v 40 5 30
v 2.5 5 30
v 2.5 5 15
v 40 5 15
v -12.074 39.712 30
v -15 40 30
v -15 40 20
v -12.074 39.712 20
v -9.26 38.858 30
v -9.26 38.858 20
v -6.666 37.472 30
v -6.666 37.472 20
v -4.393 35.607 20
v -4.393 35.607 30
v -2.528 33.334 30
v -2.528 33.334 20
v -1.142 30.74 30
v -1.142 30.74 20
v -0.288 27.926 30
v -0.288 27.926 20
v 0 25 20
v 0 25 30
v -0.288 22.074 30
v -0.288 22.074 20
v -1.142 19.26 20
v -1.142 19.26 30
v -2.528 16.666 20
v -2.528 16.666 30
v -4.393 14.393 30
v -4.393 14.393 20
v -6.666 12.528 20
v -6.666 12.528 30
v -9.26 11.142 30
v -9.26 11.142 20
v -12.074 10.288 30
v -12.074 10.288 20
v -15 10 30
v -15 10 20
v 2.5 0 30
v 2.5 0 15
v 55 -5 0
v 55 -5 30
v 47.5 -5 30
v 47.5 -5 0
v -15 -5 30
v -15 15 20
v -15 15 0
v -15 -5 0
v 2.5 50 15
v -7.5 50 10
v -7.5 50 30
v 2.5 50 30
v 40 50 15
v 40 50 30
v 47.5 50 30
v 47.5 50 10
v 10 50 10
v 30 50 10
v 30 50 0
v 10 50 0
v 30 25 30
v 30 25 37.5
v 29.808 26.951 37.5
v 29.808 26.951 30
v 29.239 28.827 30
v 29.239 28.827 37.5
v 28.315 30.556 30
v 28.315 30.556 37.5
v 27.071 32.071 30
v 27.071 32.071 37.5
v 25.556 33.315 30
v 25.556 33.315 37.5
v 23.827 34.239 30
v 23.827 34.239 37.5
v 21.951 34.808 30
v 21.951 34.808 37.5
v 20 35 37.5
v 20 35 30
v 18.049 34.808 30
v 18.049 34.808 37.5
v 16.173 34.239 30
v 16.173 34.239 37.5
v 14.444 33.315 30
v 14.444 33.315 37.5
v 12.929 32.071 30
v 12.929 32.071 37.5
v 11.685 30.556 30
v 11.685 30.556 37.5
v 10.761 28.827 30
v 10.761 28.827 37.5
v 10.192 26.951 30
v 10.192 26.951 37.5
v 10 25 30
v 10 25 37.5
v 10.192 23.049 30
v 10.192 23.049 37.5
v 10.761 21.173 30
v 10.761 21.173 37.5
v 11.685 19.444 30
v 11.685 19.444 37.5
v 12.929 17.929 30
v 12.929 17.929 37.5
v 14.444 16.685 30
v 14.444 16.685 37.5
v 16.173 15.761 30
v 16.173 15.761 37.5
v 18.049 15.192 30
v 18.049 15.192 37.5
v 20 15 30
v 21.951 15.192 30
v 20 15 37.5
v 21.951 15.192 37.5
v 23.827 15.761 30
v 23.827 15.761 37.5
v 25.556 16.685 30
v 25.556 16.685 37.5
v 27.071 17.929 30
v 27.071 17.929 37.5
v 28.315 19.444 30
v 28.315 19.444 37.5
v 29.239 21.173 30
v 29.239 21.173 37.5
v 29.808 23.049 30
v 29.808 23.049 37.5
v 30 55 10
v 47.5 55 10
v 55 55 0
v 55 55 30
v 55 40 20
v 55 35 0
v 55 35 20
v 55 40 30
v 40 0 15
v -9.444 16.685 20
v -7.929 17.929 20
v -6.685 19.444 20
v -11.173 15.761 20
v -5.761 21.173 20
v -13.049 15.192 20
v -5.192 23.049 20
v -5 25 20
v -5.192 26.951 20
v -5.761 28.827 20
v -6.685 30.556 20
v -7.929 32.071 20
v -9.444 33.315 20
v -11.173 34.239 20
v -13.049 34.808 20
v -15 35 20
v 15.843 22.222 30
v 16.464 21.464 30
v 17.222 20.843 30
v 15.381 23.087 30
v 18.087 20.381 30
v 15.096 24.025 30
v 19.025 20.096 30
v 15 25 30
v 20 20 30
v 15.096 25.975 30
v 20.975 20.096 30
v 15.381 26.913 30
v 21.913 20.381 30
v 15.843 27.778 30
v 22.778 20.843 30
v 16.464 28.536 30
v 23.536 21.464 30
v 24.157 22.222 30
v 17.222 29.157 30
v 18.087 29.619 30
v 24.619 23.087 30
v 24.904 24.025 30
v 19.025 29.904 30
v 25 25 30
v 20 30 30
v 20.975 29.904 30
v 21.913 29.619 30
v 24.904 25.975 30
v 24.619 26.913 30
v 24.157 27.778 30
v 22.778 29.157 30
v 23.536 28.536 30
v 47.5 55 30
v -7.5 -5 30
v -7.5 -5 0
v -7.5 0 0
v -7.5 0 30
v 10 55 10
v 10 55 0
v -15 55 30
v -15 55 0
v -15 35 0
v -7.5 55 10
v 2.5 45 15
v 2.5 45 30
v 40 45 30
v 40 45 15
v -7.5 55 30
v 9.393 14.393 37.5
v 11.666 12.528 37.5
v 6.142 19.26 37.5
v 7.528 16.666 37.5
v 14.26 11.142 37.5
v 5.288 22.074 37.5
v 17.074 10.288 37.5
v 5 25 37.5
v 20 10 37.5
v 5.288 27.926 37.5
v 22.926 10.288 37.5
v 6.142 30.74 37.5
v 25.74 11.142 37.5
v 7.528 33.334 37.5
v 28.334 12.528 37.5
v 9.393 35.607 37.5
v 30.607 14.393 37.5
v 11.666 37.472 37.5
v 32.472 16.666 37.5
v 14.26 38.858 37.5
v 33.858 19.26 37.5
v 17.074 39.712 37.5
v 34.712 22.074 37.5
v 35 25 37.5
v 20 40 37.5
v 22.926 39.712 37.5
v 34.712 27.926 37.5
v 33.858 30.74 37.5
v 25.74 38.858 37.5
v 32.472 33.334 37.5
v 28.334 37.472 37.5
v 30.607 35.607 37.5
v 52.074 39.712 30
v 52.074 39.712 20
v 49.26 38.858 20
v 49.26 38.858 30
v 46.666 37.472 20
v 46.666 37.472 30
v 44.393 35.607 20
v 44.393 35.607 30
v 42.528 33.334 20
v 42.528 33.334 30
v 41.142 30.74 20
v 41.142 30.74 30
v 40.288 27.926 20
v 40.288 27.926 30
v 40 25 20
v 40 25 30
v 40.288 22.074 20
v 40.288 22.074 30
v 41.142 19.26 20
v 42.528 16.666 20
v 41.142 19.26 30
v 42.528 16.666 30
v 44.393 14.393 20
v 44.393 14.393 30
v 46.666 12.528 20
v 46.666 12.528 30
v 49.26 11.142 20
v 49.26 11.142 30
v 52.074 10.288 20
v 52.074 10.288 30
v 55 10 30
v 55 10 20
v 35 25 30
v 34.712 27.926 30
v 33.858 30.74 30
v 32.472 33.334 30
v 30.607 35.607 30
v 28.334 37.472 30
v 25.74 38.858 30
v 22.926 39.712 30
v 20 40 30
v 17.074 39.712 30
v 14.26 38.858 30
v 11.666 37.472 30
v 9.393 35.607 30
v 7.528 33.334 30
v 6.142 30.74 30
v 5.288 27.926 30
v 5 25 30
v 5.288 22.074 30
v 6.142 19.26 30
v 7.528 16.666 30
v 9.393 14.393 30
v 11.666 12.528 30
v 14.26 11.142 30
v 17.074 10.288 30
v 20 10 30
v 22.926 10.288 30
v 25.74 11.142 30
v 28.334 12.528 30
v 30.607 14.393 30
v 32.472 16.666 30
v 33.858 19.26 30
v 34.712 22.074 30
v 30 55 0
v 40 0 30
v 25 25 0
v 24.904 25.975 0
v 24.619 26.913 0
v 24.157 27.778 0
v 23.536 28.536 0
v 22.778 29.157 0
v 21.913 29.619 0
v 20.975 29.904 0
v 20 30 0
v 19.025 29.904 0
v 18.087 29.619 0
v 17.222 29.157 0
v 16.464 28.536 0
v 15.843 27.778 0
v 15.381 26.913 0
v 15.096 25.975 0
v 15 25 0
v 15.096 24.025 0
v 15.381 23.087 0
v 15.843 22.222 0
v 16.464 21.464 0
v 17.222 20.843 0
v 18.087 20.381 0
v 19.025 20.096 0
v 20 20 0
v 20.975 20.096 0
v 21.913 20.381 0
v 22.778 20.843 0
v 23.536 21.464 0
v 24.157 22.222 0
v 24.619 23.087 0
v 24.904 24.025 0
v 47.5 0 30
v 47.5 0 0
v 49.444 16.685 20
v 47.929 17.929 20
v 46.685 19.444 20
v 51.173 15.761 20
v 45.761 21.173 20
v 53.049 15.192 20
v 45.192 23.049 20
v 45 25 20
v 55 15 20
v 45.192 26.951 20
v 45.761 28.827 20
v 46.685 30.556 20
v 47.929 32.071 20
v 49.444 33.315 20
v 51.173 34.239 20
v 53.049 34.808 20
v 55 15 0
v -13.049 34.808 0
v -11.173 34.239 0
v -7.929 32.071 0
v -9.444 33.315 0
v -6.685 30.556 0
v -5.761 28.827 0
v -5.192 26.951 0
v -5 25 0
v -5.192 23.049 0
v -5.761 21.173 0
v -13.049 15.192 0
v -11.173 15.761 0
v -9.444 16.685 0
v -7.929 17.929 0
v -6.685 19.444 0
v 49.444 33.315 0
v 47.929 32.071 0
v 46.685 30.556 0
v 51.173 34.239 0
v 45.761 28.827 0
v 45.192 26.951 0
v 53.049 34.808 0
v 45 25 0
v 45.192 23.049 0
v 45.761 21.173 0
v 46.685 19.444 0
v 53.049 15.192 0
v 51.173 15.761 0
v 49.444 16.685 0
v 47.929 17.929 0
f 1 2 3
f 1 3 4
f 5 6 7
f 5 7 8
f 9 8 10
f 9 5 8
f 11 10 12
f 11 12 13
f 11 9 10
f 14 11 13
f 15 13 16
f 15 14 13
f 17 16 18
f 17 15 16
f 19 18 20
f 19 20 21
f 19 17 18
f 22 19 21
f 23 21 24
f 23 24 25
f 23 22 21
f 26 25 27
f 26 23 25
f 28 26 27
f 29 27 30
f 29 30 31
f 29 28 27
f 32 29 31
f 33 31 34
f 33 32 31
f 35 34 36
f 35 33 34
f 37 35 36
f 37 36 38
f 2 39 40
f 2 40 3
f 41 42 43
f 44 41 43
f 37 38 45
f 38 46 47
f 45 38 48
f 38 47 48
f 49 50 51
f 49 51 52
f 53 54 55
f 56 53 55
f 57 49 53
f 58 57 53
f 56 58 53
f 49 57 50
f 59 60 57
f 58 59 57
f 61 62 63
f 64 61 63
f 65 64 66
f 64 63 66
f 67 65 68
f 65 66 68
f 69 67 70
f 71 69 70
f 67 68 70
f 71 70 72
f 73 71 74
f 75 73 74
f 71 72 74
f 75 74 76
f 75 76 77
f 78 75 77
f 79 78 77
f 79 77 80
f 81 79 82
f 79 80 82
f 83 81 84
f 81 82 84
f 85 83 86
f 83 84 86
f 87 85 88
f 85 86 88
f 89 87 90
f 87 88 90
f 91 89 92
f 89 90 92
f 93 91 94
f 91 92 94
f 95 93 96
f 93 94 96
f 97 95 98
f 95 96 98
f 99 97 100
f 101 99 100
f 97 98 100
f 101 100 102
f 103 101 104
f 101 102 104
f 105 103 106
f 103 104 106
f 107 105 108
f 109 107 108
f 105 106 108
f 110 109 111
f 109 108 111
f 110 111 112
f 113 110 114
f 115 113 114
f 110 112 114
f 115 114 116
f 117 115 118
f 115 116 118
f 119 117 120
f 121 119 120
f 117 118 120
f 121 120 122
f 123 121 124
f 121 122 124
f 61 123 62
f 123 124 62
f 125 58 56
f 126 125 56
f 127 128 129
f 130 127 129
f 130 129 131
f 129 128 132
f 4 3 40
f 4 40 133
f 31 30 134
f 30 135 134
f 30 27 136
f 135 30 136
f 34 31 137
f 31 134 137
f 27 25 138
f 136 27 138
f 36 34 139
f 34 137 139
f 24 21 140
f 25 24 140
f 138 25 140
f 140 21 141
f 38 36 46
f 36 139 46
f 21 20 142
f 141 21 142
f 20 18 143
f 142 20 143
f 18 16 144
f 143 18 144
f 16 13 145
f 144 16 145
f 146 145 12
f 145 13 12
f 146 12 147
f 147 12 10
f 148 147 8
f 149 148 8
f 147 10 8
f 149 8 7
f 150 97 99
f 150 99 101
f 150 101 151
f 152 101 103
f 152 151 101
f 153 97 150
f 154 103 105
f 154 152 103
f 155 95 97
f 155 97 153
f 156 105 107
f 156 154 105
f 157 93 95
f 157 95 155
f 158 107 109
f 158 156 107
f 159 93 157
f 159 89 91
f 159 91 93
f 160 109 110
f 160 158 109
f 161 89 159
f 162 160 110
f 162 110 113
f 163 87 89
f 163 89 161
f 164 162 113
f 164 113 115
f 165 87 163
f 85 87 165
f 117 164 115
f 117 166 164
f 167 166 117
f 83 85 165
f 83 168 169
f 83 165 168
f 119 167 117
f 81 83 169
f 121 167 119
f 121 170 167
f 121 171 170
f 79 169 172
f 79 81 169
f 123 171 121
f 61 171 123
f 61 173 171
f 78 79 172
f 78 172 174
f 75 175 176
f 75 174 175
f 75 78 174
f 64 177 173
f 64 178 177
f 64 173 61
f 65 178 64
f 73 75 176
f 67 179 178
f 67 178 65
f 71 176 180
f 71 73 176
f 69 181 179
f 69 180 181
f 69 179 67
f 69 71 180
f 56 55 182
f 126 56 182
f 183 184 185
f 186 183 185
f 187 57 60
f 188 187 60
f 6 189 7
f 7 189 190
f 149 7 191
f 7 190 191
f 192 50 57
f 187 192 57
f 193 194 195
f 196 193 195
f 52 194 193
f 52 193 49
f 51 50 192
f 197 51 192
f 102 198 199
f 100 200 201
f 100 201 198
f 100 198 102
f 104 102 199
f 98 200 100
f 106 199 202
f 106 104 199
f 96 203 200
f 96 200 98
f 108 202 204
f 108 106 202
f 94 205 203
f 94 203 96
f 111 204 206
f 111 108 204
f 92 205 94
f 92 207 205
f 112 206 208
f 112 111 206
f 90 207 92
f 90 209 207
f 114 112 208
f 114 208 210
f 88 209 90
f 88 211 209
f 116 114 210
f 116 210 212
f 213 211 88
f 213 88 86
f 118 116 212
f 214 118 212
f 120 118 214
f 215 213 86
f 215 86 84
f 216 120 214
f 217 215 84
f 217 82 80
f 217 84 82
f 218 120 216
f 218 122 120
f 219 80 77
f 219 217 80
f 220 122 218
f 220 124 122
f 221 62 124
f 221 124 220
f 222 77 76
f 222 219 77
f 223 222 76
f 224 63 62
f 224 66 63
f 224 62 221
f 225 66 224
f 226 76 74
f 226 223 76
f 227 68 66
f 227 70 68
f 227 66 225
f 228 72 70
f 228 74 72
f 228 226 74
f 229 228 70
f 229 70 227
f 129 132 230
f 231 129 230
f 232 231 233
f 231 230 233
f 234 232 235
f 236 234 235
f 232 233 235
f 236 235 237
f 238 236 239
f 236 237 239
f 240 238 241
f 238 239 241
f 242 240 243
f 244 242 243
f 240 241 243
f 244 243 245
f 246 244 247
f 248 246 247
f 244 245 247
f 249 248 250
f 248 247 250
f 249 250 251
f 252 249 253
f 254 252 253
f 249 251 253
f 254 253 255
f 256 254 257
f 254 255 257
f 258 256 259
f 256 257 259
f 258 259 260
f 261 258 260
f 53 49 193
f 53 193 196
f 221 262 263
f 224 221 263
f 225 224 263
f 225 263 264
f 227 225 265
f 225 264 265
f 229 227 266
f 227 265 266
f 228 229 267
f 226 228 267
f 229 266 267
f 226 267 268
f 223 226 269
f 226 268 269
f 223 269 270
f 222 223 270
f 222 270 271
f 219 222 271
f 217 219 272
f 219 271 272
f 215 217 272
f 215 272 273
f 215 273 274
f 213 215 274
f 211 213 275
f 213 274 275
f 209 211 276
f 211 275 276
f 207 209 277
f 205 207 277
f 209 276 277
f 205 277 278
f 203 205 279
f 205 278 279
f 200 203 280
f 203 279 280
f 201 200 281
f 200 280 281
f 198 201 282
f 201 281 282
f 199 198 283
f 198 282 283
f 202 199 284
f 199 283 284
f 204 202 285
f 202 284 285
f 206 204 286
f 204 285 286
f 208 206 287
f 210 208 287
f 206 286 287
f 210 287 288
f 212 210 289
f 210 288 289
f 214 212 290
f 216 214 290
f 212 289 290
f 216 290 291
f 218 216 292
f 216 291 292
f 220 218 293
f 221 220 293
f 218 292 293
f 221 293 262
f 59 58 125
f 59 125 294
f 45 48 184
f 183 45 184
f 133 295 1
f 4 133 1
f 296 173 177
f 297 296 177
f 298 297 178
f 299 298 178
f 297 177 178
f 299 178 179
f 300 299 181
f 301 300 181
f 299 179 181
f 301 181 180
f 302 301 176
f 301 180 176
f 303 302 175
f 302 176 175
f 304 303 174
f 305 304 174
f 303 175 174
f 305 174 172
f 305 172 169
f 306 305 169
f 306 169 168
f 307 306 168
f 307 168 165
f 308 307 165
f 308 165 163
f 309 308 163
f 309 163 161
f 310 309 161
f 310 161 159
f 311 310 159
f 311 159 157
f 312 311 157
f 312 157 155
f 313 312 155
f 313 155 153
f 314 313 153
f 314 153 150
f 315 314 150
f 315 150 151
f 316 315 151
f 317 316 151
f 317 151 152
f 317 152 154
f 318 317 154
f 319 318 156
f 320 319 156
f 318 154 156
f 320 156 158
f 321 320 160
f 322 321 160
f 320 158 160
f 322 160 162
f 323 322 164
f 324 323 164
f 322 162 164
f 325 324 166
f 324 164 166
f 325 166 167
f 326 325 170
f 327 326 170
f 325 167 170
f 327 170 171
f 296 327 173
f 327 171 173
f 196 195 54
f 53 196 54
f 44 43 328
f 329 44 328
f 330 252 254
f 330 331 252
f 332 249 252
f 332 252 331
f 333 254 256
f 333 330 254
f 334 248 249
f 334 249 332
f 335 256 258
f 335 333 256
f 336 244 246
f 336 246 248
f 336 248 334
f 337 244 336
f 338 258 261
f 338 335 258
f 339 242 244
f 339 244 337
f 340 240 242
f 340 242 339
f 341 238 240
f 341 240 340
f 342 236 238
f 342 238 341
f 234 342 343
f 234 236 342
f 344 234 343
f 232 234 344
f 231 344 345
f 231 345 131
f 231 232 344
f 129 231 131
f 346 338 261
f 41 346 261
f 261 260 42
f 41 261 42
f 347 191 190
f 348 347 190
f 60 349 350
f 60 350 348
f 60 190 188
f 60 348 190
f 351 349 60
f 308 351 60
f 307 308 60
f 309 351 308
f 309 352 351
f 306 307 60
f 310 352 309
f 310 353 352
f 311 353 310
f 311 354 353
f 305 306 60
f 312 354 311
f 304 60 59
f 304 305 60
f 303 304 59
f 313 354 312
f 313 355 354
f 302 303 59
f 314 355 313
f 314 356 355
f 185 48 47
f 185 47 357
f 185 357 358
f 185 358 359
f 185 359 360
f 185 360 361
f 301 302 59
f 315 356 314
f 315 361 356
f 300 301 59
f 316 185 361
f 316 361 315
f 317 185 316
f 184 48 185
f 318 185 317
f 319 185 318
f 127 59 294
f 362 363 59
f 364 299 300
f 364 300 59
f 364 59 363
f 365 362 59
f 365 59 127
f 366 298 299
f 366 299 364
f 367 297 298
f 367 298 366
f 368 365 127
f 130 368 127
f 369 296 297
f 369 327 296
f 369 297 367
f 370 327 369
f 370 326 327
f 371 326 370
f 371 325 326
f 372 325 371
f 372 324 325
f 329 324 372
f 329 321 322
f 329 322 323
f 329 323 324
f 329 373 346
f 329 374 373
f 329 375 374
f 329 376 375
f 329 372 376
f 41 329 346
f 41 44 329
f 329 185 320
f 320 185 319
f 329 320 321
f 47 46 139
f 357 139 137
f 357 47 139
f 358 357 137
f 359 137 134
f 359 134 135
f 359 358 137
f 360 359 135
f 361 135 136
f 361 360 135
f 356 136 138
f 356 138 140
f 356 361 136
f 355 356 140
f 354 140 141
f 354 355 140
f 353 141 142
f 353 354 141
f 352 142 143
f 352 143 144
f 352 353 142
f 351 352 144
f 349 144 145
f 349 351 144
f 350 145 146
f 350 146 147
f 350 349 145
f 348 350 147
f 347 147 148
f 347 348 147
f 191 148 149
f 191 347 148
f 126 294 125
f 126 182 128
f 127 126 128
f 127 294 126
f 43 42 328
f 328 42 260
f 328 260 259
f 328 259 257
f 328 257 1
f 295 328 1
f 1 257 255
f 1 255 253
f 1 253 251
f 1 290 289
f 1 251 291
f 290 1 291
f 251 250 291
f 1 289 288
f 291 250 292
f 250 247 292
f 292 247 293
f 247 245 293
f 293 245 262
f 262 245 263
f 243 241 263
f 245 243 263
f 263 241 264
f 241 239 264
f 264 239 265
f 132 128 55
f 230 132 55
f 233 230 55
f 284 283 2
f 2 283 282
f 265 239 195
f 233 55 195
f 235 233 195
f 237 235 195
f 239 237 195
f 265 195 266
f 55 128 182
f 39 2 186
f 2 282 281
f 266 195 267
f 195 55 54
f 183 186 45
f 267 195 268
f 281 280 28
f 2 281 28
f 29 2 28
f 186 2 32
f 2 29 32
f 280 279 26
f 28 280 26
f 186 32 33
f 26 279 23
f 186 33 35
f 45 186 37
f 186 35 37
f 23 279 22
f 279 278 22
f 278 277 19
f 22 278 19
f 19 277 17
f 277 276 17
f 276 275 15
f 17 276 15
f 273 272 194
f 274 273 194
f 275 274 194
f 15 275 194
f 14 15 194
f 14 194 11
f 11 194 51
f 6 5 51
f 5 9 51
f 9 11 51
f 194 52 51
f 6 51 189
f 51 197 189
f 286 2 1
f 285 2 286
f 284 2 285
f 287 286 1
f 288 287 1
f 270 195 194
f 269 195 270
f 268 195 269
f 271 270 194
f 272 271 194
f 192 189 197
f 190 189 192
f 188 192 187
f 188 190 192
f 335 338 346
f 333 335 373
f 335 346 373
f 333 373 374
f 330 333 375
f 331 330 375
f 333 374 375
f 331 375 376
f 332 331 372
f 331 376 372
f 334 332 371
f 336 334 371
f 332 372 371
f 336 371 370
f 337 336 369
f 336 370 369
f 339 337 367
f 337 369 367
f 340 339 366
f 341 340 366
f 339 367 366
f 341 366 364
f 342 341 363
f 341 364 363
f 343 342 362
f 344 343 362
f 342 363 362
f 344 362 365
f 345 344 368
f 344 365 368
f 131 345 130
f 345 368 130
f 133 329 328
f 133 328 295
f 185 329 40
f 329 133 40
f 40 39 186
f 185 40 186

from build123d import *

# Parameters (mm, degrees)
BOSS_EXTRUDE1_DEPTH = 30
CUT_EXTRUDE7_DEPTH  = 20
SKETCH5_W           = 17.5
SKETCH5_H           = 10
BOSS_EXTRUDE2_DEPTH = 5
SKETCH6_W           = 40
SKETCH6_H           = 50
BOSS_EXTRUDE3_DEPTH = 30
SKETCH7_W           = 37.5
SKETCH7_H           = 5
CUT_EXTRUDE11_DEPTH = 15
SKETCH8_W           = 37.5
SKETCH8_H           = 5
CUT_EXTRUDE12_DEPTH = 15
CUT_EXTRUDE13_DEPTH = 10
SKETCH10_R          = 15
BOSS_EXTRUDE4_DEPTH = 7.5
SKETCH11_R          = 10
CUT_EXTRUDE14_DEPTH = 7.5
SKETCH12_R          = 5
CUT_EXTRUDE15_DEPTH = 153.5
BOSS_EXTRUDE5_DEPTH = 30
SKETCH14_W          = 17.5
SKETCH14_H          = 10
BOSS_EXTRUDE6_DEPTH = 5
CUT_EXTRUDE16_DEPTH = 20
CUT_EXTRUDE17_DEPTH = 10


with BuildPart() as part:
    # Sketch1 → Boss-Extrude1 (new body)
    with BuildSketch(Plane.XY):
        Polygon((-15, -5), (-7.5, -5), (-7.5, 0), (0, 0), (0, 50), (-7.5, 50), (-7.5, 55), (-15, 55), align=None)
    extrude(amount=BOSS_EXTRUDE1_DEPTH)

    # Sketch3 → Cut-Extrude7 (cut)
    with BuildSketch(Plane(origin=(0, 0, 0), x_dir=(-1, 0, 0), z_dir=(0, 0, -1))):
        with BuildLine():
            Line((15, 35), (15, 15))
            ThreePointArc((15, 15), (5, 25), (15, 35))
        make_face()
    extrude(amount=-CUT_EXTRUDE7_DEPTH, mode=Mode.SUBTRACT)

    # Sketch5 → Boss-Extrude2 (add)
    with BuildSketch(Plane(origin=(0, 50, 0), x_dir=(1, 0, 0), z_dir=(0, 1, 0))):
        with Locations((1.25, -5)):
            Rectangle(SKETCH5_W, SKETCH5_H)
    extrude(amount=BOSS_EXTRUDE2_DEPTH)

    # Sketch6 → Boss-Extrude3 (add)
    with BuildSketch(Plane(origin=(0, 0, 0), x_dir=(-1, 0, 0), z_dir=(0, 0, -1))):
        with Locations((-20, 25)):
            Rectangle(SKETCH6_W, SKETCH6_H)
    extrude(amount=-BOSS_EXTRUDE3_DEPTH)

    # Sketch7 → Cut-Extrude11 (cut)
    with BuildSketch(Plane.XY.offset(30)):
        with Locations((21.25, 47.5)):
            Rectangle(SKETCH7_W, SKETCH7_H)
    extrude(amount=-CUT_EXTRUDE11_DEPTH, mode=Mode.SUBTRACT)

    # Sketch8 → Cut-Extrude12 (cut)
    with BuildSketch(Plane.XY.offset(30)):
        with Locations((21.25, 2.5)):
            Rectangle(SKETCH8_W, SKETCH8_H)
    extrude(amount=-CUT_EXTRUDE12_DEPTH, mode=Mode.SUBTRACT)

    # Sketch9 → Cut-Extrude13 (cut)
    with BuildSketch(Plane.XY.offset(30)):
        with BuildLine():
            Line((-15, 10), (-15, 40))
            ThreePointArc((-15, 40), (0, 25), (-15, 10))
        make_face()
    extrude(amount=-CUT_EXTRUDE13_DEPTH, mode=Mode.SUBTRACT)

    # Sketch10 → Boss-Extrude4 (add)
    with BuildSketch(Plane.XY.offset(30)):
        with Locations((20, 25)):
            Circle(SKETCH10_R)
    extrude(amount=BOSS_EXTRUDE4_DEPTH)

    # Sketch11 → Cut-Extrude14 (cut)
    with BuildSketch(Plane.XY.offset(37.5)):
        with Locations((20, 25)):
            Circle(SKETCH11_R)
    extrude(amount=-CUT_EXTRUDE14_DEPTH, mode=Mode.SUBTRACT)

    # Sketch12 → Cut-Extrude15 (cut)
    with BuildSketch(Plane.XY.offset(30)):
        with Locations((20, 25)):
            Circle(SKETCH12_R)
    extrude(amount=-CUT_EXTRUDE15_DEPTH, mode=Mode.SUBTRACT)

    # Sketch13 → Boss-Extrude5 (add)
    with BuildSketch(Plane.XY.offset(30)):
        Polygon((55, -5), (47.5, -5), (47.5, 0), (40, 0), (40, 50), (47.5, 50), (47.5, 55), (55, 55), align=None)
    extrude(amount=-BOSS_EXTRUDE5_DEPTH)

    # Sketch14 → Boss-Extrude6 (add)
    with BuildSketch(Plane(origin=(0, 50, 0), x_dir=(1, 0, 0), z_dir=(0, 1, 0))):
        with Locations((38.75, -5)):
            Rectangle(SKETCH14_W, SKETCH14_H)
    extrude(amount=BOSS_EXTRUDE6_DEPTH)

    # Sketch15 → Cut-Extrude16 (cut)
    with BuildSketch(Plane(origin=(0, 0, 0), x_dir=(-1, 0, 0), z_dir=(0, 0, -1))):
        with BuildLine():
            Line((-55, 35), (-55, 15))
            ThreePointArc((-55, 15), (-45, 25), (-55, 35))
        make_face()
    extrude(amount=-CUT_EXTRUDE16_DEPTH, mode=Mode.SUBTRACT)

    # Sketch16 → Cut-Extrude17 (cut)
    with BuildSketch(Plane.XY.offset(30)):
        with BuildLine():
            Line((55, 10), (55, 40))
            ThreePointArc((55, 40), (40, 25), (55, 10))
        make_face()
    extrude(amount=-CUT_EXTRUDE17_DEPTH, mode=Mode.SUBTRACT)


solid = part.part
